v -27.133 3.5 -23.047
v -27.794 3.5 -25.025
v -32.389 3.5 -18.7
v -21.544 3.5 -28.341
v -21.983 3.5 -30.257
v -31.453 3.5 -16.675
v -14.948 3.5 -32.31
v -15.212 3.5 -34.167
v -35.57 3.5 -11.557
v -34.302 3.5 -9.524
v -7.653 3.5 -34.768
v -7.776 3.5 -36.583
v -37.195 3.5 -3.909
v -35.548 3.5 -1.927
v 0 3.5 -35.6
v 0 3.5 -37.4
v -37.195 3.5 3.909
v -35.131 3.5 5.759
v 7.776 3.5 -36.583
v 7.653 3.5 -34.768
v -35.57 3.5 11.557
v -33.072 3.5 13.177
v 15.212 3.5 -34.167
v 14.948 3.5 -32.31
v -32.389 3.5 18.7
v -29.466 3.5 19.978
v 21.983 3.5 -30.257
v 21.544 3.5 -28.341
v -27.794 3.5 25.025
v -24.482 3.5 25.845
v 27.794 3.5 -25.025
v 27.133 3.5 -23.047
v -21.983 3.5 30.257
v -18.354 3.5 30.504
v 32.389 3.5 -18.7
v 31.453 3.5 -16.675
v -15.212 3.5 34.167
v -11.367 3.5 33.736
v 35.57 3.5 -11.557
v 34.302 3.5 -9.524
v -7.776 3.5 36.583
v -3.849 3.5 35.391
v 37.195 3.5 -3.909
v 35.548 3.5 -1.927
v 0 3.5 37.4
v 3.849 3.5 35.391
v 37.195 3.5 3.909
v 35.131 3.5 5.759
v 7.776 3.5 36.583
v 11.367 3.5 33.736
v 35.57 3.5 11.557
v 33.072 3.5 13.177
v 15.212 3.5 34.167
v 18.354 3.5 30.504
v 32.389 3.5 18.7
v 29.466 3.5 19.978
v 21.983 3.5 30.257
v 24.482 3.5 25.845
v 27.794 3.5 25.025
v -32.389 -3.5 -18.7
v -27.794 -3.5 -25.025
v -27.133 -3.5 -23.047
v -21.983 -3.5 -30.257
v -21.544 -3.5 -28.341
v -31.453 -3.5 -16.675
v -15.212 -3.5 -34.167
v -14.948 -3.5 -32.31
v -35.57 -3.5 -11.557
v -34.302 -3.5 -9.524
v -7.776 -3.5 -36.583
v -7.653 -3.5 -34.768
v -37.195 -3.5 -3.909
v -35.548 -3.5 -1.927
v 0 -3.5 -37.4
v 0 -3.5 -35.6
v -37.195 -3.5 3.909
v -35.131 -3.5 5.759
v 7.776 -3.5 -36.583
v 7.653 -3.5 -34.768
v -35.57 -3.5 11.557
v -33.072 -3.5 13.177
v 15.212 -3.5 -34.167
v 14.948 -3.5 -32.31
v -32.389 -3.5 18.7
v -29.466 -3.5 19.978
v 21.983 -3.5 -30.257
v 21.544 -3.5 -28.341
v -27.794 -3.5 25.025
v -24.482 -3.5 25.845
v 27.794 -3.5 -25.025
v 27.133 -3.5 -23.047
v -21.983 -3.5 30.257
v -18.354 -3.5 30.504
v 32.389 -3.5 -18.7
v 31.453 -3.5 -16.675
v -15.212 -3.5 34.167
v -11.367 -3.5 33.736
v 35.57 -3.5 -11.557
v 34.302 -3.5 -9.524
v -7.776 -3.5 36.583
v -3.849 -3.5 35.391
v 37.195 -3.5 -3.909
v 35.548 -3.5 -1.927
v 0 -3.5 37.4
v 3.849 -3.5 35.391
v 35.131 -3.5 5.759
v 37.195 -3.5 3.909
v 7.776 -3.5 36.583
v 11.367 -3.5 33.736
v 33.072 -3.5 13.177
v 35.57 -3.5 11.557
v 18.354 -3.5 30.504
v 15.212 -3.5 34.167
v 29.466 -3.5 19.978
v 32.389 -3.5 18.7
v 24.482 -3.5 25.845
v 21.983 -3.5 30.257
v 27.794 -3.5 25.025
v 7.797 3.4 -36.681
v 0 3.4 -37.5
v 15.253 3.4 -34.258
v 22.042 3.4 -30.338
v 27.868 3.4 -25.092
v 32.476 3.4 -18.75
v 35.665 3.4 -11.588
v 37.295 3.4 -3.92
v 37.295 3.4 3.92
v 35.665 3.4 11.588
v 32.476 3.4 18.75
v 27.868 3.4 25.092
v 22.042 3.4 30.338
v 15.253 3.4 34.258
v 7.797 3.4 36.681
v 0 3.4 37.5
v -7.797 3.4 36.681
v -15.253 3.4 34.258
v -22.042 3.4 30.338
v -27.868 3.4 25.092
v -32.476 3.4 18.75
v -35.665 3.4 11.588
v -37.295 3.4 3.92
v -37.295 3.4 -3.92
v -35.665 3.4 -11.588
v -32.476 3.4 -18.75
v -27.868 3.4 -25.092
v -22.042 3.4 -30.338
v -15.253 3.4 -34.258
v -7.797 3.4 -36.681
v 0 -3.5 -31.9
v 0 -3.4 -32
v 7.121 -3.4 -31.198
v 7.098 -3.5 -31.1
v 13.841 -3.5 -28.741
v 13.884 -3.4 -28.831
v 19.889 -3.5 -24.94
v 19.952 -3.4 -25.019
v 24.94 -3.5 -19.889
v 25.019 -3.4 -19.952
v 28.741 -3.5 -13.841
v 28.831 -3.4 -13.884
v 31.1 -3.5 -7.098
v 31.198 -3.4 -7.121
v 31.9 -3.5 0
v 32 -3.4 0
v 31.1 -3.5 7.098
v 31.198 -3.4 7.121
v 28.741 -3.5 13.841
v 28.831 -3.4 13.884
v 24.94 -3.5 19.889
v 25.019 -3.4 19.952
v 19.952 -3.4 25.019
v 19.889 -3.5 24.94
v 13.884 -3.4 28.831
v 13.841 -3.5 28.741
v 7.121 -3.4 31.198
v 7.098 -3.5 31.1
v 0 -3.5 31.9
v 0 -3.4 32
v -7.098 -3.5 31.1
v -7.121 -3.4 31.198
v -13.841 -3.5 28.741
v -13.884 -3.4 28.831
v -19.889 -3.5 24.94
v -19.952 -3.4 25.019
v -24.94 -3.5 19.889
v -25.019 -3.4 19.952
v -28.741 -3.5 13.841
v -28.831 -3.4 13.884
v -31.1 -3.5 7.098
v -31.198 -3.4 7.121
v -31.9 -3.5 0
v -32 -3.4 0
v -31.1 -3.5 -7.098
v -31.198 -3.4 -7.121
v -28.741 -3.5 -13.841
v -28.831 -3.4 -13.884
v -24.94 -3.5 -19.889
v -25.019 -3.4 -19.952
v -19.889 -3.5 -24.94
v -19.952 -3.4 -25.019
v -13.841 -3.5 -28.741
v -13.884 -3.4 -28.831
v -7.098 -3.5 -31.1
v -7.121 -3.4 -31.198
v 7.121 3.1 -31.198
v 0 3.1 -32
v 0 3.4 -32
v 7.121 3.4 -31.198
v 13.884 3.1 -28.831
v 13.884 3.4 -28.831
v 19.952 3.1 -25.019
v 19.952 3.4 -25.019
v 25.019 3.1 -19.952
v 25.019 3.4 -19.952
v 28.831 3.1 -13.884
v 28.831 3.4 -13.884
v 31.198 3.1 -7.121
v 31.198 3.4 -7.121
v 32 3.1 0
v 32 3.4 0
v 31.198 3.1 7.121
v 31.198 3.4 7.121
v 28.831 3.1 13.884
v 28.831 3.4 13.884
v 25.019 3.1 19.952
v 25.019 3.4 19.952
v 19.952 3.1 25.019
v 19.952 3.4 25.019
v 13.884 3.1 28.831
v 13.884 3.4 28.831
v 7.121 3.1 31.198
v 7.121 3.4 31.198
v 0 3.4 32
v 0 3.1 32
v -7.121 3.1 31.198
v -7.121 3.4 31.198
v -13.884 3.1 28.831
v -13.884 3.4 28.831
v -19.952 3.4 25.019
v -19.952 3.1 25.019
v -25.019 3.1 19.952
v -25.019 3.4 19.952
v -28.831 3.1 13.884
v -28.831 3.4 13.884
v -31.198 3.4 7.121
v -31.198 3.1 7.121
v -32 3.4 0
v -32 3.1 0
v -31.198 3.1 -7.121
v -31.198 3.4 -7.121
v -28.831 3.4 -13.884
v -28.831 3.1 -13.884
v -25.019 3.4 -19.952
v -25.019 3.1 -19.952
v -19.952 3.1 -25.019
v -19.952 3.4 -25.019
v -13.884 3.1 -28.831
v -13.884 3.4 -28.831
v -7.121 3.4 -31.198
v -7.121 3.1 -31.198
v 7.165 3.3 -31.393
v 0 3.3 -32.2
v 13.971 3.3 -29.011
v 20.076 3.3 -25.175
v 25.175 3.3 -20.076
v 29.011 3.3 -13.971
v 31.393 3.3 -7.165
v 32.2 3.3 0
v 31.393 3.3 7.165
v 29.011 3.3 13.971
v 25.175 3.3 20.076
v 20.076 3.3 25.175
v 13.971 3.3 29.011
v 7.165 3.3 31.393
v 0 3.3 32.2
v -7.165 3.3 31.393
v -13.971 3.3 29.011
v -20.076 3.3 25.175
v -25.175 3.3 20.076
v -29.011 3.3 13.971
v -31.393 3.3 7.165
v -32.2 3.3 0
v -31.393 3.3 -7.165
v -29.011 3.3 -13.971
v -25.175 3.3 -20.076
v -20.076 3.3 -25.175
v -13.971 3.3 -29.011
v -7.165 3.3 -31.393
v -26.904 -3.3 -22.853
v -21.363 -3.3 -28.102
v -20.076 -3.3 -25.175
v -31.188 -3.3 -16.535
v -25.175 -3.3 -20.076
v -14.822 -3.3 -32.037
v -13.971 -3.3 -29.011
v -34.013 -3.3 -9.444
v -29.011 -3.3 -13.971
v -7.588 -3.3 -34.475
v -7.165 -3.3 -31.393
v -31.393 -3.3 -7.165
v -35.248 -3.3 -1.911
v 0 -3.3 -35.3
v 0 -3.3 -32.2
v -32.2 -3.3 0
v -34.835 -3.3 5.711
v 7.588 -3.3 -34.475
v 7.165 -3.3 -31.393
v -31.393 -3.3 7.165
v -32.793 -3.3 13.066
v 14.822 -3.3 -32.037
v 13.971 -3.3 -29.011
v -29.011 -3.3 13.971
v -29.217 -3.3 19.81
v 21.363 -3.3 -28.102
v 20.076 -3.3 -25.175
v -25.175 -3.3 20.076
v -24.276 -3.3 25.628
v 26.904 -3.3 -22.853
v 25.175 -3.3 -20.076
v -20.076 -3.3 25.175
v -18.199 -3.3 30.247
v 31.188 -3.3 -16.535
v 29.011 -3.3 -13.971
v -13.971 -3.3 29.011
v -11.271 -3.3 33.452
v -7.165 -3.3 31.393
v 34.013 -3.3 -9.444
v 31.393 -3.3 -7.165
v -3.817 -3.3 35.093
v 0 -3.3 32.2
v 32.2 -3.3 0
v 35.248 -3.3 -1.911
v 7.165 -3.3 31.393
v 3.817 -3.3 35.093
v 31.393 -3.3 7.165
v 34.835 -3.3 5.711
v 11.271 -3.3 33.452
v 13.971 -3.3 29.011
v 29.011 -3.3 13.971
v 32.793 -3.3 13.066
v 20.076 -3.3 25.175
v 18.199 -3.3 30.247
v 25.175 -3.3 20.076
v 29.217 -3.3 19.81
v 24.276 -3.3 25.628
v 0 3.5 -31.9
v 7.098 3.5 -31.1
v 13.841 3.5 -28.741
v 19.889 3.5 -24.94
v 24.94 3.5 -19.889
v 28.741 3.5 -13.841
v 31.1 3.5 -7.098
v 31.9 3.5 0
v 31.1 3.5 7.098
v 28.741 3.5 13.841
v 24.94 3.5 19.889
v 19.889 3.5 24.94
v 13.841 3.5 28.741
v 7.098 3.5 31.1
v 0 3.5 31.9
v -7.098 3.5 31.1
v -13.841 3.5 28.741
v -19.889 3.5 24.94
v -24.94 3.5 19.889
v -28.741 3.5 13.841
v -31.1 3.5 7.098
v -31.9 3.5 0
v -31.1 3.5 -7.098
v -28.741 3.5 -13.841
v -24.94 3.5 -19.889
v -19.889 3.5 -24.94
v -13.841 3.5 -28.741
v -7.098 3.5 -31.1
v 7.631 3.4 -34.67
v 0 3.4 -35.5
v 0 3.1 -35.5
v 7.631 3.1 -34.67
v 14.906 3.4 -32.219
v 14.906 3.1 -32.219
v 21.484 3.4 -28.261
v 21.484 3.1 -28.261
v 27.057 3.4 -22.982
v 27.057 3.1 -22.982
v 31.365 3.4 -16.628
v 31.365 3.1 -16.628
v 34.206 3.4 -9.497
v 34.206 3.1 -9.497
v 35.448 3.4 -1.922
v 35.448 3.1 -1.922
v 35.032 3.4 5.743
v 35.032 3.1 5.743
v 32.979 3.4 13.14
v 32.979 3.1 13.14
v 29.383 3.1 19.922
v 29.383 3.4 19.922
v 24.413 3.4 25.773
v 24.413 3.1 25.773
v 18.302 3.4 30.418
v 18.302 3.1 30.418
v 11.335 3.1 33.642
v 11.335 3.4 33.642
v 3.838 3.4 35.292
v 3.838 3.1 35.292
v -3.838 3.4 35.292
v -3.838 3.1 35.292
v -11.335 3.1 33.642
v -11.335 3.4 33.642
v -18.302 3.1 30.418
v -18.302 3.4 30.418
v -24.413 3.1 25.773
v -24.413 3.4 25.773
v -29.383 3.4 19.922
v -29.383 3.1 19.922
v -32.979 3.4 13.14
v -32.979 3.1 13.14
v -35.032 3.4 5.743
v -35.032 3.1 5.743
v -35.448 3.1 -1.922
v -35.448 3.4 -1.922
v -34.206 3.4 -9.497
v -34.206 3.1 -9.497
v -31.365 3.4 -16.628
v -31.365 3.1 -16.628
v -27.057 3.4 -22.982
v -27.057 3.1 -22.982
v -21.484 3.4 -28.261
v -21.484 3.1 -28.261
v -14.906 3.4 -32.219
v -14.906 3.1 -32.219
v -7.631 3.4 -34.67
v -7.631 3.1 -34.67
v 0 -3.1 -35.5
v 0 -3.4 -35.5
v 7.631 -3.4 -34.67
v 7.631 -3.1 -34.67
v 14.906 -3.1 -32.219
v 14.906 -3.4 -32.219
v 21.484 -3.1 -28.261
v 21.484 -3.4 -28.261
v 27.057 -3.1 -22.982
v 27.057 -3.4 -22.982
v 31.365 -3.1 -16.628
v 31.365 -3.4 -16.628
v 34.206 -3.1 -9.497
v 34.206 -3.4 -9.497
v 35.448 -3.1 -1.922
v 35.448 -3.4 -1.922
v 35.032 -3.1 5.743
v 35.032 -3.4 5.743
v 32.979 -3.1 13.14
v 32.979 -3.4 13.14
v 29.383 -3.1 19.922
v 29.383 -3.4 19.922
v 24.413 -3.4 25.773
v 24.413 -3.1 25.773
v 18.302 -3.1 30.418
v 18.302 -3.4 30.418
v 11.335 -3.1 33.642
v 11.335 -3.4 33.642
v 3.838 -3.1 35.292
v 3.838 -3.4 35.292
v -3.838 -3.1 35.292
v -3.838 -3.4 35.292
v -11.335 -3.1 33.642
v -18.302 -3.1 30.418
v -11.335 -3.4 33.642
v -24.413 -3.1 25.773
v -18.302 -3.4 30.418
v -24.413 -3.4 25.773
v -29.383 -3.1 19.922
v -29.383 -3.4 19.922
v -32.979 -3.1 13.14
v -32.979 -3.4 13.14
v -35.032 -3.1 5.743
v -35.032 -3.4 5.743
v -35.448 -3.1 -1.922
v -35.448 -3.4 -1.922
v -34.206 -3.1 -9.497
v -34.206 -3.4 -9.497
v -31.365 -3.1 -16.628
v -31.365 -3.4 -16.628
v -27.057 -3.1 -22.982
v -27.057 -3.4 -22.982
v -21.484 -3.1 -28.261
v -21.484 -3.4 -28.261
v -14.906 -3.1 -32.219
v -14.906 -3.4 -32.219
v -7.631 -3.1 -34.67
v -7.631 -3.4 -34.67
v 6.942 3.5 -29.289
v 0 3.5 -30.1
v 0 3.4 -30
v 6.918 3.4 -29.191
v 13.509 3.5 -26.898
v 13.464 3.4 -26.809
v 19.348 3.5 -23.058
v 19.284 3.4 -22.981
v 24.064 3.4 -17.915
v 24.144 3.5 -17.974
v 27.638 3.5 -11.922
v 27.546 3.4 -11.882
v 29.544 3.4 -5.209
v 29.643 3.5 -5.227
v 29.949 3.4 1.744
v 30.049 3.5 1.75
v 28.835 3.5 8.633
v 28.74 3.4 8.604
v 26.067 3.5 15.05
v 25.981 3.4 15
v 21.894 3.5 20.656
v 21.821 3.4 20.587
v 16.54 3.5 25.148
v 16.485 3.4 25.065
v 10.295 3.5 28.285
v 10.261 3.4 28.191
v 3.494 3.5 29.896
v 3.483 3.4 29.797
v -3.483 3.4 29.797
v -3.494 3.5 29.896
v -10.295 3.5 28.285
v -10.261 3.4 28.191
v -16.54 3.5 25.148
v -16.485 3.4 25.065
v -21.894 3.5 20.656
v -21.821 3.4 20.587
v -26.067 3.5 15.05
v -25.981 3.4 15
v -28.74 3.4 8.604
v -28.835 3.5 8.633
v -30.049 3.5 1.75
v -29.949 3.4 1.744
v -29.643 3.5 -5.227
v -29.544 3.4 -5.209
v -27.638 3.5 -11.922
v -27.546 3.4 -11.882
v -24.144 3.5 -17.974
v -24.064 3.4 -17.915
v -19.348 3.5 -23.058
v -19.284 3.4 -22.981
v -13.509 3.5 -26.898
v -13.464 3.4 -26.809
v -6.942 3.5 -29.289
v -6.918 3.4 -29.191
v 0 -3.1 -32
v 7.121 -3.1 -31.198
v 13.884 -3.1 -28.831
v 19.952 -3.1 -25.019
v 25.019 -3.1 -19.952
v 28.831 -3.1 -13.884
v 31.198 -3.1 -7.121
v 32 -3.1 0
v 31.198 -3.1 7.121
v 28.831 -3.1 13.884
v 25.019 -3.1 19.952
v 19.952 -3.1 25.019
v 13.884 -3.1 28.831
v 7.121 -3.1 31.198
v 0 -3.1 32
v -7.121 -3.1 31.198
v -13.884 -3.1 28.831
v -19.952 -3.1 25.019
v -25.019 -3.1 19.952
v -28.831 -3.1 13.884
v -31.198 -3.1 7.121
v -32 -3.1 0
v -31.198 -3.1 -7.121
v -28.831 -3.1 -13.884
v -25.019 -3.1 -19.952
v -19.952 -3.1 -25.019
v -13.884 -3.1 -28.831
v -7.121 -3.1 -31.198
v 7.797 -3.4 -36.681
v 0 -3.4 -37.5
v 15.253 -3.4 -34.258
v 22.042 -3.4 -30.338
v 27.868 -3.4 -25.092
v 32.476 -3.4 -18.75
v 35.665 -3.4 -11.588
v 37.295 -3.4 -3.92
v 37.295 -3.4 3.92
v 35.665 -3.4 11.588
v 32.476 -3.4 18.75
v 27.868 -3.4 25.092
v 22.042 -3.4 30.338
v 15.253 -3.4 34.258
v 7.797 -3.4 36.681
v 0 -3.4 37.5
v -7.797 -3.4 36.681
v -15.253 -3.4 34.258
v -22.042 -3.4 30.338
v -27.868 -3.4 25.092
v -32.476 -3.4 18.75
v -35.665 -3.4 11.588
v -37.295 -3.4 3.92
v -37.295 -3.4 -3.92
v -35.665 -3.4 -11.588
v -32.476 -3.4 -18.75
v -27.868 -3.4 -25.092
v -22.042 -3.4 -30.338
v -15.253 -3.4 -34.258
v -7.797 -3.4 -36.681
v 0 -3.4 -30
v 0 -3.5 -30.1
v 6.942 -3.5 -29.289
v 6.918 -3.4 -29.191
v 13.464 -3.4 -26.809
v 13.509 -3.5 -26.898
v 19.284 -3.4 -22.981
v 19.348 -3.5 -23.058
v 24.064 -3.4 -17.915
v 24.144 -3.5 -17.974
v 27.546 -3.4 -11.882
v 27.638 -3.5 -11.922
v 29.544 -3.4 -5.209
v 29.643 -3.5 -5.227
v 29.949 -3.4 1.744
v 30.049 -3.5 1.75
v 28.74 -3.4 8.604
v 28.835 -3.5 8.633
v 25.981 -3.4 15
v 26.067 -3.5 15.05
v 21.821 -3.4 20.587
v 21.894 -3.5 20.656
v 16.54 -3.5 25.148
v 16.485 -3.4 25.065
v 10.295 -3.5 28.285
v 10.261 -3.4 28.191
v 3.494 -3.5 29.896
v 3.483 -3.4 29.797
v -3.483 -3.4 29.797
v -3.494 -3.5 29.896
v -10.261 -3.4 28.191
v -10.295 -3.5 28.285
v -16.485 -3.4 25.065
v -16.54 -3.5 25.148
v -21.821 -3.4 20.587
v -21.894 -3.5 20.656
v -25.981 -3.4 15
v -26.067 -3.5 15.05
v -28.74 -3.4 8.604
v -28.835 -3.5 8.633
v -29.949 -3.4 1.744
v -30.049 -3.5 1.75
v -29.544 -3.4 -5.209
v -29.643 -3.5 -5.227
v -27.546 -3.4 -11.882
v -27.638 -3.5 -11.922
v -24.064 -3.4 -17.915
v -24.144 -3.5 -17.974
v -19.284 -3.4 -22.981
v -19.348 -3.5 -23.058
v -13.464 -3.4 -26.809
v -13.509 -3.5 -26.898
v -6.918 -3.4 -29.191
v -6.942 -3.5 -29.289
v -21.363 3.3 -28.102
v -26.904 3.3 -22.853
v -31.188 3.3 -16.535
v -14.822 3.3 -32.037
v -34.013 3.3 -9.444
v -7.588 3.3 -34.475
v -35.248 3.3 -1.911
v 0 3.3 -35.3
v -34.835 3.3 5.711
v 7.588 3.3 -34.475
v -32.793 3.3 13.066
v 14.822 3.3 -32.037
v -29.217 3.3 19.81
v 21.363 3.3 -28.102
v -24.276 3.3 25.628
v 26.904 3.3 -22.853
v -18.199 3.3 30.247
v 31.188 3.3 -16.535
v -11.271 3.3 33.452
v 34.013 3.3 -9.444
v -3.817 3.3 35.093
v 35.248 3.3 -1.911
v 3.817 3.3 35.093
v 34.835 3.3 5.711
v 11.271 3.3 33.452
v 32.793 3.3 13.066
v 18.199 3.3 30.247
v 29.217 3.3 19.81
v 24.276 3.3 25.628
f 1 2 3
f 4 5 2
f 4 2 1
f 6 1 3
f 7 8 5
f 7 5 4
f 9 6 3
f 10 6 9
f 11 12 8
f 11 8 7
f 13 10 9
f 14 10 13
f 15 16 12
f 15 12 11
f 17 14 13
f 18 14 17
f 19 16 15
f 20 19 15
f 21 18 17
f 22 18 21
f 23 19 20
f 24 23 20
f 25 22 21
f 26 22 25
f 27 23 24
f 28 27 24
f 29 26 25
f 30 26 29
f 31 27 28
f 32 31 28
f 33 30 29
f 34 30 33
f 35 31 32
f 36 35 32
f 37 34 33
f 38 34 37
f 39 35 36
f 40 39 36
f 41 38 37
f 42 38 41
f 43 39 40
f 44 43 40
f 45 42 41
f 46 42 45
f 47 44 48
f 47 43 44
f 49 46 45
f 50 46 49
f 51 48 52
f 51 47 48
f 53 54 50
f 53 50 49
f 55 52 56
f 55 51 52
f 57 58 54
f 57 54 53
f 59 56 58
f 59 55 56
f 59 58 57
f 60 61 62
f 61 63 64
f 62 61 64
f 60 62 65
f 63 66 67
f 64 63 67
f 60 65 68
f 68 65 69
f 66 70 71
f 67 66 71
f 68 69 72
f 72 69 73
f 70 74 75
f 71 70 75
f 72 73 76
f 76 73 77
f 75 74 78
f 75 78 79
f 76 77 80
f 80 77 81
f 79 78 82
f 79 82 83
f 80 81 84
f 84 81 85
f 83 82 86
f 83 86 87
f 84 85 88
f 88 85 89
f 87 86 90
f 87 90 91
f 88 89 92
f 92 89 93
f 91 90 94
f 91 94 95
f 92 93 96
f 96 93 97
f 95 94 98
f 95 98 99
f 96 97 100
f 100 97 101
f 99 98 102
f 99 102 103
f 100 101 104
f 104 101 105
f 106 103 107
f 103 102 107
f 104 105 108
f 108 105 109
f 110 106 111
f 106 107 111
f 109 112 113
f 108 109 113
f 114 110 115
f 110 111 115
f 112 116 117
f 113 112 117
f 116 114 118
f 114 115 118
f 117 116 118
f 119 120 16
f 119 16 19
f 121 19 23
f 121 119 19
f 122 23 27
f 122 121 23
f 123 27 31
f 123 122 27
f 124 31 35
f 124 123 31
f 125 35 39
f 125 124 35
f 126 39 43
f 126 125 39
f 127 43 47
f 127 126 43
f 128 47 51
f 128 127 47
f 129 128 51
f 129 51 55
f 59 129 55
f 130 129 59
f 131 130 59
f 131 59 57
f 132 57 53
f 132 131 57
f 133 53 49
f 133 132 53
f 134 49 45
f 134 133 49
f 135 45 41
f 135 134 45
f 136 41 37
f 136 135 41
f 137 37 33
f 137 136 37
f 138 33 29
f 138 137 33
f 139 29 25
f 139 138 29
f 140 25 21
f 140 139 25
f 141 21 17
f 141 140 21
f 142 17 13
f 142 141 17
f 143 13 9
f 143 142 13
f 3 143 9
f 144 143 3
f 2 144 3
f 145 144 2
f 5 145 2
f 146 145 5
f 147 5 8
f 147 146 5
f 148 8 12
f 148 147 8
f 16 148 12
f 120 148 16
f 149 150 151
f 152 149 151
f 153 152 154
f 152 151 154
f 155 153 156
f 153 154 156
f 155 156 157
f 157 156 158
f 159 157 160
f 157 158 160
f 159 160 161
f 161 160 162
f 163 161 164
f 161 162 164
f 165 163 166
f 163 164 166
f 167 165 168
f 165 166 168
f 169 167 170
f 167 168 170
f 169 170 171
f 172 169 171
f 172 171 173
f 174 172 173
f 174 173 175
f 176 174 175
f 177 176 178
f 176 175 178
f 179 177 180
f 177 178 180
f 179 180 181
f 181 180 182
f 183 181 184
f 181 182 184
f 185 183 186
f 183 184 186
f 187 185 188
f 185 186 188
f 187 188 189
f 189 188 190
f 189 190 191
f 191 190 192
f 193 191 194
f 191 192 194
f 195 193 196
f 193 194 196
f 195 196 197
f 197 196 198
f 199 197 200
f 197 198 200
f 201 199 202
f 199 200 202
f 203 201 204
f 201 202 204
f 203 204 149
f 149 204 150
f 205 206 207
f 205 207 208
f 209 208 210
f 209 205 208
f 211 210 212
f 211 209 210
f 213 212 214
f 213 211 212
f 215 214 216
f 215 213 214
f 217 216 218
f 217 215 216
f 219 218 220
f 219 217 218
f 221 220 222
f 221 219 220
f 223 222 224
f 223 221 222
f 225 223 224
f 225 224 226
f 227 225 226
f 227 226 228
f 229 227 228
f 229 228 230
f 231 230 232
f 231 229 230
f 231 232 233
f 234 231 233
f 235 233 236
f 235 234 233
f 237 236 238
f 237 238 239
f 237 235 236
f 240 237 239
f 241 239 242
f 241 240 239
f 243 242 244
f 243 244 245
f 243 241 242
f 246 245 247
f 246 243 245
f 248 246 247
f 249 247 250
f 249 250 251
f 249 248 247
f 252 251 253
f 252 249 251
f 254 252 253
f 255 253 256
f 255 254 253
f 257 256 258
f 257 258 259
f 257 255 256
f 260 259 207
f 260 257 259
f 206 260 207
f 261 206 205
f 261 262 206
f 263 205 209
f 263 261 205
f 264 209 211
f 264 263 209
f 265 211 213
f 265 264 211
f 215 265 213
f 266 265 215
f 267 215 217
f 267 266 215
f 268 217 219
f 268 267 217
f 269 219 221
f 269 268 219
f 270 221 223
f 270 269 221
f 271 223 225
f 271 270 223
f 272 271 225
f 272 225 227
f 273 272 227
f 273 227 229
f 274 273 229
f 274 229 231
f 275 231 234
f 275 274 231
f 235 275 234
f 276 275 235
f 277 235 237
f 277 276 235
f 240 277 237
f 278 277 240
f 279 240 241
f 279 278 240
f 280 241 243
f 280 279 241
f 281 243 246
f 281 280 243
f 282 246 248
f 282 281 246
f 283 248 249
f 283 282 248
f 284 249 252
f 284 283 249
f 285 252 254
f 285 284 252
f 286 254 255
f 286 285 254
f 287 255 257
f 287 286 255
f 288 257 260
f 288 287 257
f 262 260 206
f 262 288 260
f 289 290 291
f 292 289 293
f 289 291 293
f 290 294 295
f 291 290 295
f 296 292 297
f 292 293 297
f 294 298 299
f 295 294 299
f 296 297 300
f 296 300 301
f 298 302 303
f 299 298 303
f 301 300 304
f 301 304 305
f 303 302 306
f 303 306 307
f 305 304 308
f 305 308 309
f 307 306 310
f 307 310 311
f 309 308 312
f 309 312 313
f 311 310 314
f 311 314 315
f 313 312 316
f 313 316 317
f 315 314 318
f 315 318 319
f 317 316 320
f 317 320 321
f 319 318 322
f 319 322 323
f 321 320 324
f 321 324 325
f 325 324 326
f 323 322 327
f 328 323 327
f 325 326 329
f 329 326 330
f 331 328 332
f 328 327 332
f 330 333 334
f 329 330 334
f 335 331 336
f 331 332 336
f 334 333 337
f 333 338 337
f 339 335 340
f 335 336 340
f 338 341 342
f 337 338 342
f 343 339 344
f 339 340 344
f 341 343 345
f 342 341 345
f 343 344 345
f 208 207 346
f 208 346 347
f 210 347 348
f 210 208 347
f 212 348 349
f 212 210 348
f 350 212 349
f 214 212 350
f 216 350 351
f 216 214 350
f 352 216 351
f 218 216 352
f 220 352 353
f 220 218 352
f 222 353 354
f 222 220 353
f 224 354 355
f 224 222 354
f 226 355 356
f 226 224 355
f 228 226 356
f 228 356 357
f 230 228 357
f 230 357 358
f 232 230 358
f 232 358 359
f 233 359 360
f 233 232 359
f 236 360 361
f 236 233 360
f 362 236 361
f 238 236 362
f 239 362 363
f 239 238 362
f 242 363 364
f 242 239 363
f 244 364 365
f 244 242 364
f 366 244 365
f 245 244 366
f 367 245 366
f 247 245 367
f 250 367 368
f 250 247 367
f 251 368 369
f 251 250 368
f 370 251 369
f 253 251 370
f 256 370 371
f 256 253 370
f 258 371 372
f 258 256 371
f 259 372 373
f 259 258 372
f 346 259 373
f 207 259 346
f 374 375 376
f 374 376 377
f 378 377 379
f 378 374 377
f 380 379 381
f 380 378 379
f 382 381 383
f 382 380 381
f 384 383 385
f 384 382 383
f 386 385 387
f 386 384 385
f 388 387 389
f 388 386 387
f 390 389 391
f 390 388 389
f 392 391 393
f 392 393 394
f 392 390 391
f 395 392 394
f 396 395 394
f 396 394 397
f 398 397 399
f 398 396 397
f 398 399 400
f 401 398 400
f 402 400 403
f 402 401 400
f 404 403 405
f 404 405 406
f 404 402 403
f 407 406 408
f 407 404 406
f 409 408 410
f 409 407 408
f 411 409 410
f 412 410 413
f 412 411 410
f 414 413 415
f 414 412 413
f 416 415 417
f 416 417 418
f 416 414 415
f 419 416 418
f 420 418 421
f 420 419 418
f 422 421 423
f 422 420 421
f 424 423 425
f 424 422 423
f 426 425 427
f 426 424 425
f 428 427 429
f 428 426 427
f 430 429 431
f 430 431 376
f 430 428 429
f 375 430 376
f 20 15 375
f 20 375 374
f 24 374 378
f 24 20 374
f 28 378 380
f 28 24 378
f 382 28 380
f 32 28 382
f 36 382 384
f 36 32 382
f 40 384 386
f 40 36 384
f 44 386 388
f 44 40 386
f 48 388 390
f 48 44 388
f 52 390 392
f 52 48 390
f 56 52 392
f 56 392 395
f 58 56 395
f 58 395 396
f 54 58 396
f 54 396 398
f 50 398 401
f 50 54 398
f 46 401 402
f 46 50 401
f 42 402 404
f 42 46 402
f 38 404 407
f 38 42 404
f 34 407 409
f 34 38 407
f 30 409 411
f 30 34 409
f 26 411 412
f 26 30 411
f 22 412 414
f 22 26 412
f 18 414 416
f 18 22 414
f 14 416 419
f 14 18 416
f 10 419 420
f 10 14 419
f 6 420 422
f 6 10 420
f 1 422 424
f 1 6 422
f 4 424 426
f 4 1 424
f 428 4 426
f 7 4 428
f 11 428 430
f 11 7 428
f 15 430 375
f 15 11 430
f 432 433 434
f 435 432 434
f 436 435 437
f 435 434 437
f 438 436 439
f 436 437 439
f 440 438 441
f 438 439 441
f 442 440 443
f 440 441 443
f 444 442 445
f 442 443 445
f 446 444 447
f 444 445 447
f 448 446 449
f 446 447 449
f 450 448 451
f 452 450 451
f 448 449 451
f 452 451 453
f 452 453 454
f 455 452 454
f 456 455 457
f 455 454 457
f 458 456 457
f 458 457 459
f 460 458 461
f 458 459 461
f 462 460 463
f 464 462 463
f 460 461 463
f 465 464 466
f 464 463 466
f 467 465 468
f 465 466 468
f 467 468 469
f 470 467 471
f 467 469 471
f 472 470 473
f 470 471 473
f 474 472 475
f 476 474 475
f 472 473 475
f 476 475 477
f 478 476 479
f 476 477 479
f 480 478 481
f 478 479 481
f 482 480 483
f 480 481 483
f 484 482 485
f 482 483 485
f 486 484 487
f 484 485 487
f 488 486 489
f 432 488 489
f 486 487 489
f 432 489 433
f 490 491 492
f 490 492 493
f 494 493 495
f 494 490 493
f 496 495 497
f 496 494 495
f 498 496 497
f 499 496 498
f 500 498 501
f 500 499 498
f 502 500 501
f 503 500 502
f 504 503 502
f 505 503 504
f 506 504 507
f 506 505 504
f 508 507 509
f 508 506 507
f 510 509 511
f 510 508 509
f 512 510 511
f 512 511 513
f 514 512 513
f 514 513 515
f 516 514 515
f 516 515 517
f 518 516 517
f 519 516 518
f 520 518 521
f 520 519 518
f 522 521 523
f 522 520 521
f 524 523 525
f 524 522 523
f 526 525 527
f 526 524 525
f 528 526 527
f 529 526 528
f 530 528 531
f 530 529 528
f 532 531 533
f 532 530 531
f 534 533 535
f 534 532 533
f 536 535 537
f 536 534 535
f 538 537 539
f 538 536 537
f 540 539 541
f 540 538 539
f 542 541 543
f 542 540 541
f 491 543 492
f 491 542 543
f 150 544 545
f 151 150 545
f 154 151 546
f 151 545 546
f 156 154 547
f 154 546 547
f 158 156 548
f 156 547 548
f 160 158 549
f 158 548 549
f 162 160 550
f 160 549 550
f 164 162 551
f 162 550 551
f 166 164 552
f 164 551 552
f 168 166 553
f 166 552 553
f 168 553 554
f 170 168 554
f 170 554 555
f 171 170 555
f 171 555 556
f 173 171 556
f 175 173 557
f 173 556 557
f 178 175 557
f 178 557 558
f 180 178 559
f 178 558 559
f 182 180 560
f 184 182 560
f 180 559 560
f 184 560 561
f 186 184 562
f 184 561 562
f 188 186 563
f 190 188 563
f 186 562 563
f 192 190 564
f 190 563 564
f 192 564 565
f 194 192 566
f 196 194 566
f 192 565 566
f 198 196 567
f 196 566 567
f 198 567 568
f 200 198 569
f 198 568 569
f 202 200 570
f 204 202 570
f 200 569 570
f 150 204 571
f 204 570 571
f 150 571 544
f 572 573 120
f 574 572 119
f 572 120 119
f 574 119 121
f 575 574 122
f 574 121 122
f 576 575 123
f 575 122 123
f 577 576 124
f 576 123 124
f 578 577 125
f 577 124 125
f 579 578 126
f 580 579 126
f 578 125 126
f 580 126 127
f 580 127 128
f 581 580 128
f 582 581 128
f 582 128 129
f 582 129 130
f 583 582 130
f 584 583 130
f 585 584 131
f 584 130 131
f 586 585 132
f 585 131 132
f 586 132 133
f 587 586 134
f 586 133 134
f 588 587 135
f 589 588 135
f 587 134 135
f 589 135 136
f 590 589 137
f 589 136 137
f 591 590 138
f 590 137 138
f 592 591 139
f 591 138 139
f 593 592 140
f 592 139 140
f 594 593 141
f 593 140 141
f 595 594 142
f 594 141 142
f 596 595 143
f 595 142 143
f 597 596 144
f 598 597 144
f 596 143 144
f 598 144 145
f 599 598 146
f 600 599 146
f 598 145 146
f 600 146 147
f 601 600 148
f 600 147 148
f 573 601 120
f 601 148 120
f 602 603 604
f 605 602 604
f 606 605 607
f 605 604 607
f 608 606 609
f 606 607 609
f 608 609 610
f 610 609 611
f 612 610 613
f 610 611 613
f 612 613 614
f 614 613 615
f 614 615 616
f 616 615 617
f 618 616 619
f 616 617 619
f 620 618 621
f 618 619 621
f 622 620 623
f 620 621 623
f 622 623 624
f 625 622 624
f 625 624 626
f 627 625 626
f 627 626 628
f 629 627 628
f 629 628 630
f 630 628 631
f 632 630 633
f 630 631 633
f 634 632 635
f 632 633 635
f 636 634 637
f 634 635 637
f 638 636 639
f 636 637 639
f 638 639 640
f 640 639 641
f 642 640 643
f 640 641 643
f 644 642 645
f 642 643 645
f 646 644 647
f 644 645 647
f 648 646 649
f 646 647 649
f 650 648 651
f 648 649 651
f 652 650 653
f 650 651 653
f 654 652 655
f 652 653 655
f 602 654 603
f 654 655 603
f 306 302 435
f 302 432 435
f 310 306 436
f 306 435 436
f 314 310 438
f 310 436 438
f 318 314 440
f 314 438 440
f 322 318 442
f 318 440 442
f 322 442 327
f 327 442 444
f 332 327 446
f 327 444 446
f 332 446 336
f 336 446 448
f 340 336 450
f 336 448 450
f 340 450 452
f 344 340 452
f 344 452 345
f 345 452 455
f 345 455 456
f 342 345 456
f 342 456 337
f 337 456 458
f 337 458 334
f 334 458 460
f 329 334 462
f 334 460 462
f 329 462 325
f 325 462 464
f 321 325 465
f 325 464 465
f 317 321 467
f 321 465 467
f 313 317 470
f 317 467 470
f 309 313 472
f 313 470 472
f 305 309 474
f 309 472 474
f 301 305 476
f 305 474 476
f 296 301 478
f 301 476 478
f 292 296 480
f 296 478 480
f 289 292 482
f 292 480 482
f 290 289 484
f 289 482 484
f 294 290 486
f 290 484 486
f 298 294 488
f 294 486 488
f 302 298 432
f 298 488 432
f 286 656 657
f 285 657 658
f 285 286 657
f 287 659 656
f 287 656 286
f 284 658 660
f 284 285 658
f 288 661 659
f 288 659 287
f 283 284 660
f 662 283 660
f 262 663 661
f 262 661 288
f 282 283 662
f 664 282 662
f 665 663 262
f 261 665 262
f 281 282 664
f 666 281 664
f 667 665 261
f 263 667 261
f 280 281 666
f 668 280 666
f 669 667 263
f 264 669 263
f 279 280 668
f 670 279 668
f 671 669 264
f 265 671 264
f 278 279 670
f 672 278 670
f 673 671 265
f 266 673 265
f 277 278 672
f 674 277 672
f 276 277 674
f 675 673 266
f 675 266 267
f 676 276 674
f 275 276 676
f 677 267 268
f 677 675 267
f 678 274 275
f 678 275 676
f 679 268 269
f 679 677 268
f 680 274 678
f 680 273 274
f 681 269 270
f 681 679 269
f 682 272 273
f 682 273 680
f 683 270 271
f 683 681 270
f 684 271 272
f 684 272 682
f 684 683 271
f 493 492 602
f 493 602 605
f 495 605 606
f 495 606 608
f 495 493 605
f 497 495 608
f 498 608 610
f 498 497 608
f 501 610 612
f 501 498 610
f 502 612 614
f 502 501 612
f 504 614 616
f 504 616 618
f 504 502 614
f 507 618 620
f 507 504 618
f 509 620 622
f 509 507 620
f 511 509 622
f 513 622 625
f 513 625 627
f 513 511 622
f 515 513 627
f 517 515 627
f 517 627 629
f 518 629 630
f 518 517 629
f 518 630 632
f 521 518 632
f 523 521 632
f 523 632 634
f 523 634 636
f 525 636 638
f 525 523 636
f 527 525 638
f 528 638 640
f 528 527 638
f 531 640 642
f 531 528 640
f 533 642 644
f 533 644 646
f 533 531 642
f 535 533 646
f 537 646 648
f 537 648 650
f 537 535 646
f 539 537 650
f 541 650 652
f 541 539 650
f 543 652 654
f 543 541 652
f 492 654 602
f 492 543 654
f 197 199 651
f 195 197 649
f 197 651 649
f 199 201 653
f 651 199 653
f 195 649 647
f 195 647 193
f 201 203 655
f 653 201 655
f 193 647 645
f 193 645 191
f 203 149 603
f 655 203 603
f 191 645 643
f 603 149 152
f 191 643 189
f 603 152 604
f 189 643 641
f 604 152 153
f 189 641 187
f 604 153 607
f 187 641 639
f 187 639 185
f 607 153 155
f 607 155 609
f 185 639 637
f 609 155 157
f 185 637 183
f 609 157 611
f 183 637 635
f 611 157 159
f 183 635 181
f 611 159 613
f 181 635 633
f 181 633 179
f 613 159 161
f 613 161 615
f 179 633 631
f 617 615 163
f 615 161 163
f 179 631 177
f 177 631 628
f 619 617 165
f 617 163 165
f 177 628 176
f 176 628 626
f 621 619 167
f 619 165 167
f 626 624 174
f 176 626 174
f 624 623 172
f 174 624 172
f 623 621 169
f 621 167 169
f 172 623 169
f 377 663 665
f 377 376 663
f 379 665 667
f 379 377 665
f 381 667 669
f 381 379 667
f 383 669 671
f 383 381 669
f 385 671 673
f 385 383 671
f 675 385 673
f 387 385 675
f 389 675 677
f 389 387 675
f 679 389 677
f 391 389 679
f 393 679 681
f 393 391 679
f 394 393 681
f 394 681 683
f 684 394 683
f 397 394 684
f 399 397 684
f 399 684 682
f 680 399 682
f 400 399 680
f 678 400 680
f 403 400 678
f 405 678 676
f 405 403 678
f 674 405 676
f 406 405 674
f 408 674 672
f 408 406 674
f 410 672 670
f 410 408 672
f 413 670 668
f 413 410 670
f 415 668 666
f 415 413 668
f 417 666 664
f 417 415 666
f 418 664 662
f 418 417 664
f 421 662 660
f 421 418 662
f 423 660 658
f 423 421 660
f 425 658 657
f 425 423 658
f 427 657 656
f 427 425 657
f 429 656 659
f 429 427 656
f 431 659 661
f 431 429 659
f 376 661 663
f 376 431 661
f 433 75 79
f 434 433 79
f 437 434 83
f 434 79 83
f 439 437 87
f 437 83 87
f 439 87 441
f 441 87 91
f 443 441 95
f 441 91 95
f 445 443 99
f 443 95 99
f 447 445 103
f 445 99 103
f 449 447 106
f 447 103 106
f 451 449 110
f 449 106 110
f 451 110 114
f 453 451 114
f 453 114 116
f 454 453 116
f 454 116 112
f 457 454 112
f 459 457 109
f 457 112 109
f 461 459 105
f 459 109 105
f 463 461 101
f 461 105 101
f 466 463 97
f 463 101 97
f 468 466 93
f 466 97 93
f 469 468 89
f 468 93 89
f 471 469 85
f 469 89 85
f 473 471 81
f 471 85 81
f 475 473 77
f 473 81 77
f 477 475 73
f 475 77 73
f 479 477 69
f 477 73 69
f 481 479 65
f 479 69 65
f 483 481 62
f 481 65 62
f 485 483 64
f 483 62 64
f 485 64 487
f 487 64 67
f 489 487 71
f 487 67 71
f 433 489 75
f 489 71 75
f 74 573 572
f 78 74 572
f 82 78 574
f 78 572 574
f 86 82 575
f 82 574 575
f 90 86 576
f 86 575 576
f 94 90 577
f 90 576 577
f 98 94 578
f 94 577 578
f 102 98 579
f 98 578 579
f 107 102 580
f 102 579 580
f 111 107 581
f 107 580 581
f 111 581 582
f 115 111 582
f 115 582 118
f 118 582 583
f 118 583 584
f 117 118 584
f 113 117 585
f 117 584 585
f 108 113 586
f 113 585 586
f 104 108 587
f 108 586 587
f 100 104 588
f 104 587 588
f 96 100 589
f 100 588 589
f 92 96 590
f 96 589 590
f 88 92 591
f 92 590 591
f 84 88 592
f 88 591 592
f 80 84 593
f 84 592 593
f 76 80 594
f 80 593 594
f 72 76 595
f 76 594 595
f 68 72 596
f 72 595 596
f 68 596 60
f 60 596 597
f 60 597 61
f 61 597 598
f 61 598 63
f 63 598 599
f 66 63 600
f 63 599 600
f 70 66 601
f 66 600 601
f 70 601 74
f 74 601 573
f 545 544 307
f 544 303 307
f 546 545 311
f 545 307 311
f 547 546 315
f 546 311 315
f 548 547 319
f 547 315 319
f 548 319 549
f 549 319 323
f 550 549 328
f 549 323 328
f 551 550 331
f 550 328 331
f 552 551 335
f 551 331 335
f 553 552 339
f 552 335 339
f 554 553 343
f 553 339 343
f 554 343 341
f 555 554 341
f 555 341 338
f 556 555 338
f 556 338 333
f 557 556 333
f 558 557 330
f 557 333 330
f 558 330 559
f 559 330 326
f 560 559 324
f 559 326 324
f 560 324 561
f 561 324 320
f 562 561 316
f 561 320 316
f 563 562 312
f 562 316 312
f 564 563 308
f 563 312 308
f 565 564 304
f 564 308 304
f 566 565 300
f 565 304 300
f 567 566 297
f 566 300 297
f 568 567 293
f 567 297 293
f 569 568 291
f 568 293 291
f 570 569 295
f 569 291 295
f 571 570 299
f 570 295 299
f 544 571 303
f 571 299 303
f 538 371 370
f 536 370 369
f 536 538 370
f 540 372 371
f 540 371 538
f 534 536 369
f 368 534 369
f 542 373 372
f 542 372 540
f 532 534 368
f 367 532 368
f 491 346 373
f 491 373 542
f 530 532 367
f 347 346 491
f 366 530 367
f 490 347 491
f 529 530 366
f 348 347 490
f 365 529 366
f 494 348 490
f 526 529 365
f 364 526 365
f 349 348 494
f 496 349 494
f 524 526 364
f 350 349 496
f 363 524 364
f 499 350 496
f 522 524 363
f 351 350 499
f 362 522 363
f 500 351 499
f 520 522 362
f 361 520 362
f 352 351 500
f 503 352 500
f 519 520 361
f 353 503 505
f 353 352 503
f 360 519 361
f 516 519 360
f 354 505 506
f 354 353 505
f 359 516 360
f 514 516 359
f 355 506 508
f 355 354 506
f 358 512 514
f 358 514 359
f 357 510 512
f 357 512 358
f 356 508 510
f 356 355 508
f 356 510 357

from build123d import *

# Parameters (mm, degrees)
SKETCH1_W     = 7.5
SKETCH1_H     = 7
CHAMFER1_SIZE = 0.1


with BuildPart() as part:
    # Sketch1 → Revolve1 (revolve)
    with BuildSketch(Plane(origin=(0, 0, 0), x_dir=(0, 0, -1), z_dir=(1, 0, 0))):
        with Locations((33.75, 0)):
            Rectangle(SKETCH1_W, SKETCH1_H)
    revolve(axis=Axis((0, 3.5, 0), (0, -1, 0)))

    # Sketch3 → Cut-Revolve2 (revolve, cut)
    with BuildSketch(Plane(origin=(0, 0, 0), x_dir=(0, 0, -1), z_dir=(1, 0, 0))):
        Polygon((35.3, 3.3), (35.5, 3.1), (35.5, 3.5), (32, 3.5), (32, 3.1), (32.2, 3.3), align=None)
    cut_revolve2 = revolve(axis=Axis((0, 3.5, 0), (0, -1, 0)), mode=Mode.SUBTRACT)

    # Mirror1: Cut-Revolve2 across plane
    add(cut_revolve2.mirror(Plane.ZX), mode=Mode.SUBTRACT)

    # Chamfer1
    chamfer1_edges = [part.edges().sort_by_distance(p)[0] for p in [
        (0, 3.5, 35.5),
        (0, 3.5, 32),
        (0, -3.5, 35.5),
        (0, -3.5, 32),
        (0, 3.5, 37.5),
        (0, -3.5, 37.5),
        (0, -3.5, 30),
        (0, 3.5, 30),
    ]]
    chamfer(chamfer1_edges, length=CHAMFER1_SIZE)


solid = part.part
